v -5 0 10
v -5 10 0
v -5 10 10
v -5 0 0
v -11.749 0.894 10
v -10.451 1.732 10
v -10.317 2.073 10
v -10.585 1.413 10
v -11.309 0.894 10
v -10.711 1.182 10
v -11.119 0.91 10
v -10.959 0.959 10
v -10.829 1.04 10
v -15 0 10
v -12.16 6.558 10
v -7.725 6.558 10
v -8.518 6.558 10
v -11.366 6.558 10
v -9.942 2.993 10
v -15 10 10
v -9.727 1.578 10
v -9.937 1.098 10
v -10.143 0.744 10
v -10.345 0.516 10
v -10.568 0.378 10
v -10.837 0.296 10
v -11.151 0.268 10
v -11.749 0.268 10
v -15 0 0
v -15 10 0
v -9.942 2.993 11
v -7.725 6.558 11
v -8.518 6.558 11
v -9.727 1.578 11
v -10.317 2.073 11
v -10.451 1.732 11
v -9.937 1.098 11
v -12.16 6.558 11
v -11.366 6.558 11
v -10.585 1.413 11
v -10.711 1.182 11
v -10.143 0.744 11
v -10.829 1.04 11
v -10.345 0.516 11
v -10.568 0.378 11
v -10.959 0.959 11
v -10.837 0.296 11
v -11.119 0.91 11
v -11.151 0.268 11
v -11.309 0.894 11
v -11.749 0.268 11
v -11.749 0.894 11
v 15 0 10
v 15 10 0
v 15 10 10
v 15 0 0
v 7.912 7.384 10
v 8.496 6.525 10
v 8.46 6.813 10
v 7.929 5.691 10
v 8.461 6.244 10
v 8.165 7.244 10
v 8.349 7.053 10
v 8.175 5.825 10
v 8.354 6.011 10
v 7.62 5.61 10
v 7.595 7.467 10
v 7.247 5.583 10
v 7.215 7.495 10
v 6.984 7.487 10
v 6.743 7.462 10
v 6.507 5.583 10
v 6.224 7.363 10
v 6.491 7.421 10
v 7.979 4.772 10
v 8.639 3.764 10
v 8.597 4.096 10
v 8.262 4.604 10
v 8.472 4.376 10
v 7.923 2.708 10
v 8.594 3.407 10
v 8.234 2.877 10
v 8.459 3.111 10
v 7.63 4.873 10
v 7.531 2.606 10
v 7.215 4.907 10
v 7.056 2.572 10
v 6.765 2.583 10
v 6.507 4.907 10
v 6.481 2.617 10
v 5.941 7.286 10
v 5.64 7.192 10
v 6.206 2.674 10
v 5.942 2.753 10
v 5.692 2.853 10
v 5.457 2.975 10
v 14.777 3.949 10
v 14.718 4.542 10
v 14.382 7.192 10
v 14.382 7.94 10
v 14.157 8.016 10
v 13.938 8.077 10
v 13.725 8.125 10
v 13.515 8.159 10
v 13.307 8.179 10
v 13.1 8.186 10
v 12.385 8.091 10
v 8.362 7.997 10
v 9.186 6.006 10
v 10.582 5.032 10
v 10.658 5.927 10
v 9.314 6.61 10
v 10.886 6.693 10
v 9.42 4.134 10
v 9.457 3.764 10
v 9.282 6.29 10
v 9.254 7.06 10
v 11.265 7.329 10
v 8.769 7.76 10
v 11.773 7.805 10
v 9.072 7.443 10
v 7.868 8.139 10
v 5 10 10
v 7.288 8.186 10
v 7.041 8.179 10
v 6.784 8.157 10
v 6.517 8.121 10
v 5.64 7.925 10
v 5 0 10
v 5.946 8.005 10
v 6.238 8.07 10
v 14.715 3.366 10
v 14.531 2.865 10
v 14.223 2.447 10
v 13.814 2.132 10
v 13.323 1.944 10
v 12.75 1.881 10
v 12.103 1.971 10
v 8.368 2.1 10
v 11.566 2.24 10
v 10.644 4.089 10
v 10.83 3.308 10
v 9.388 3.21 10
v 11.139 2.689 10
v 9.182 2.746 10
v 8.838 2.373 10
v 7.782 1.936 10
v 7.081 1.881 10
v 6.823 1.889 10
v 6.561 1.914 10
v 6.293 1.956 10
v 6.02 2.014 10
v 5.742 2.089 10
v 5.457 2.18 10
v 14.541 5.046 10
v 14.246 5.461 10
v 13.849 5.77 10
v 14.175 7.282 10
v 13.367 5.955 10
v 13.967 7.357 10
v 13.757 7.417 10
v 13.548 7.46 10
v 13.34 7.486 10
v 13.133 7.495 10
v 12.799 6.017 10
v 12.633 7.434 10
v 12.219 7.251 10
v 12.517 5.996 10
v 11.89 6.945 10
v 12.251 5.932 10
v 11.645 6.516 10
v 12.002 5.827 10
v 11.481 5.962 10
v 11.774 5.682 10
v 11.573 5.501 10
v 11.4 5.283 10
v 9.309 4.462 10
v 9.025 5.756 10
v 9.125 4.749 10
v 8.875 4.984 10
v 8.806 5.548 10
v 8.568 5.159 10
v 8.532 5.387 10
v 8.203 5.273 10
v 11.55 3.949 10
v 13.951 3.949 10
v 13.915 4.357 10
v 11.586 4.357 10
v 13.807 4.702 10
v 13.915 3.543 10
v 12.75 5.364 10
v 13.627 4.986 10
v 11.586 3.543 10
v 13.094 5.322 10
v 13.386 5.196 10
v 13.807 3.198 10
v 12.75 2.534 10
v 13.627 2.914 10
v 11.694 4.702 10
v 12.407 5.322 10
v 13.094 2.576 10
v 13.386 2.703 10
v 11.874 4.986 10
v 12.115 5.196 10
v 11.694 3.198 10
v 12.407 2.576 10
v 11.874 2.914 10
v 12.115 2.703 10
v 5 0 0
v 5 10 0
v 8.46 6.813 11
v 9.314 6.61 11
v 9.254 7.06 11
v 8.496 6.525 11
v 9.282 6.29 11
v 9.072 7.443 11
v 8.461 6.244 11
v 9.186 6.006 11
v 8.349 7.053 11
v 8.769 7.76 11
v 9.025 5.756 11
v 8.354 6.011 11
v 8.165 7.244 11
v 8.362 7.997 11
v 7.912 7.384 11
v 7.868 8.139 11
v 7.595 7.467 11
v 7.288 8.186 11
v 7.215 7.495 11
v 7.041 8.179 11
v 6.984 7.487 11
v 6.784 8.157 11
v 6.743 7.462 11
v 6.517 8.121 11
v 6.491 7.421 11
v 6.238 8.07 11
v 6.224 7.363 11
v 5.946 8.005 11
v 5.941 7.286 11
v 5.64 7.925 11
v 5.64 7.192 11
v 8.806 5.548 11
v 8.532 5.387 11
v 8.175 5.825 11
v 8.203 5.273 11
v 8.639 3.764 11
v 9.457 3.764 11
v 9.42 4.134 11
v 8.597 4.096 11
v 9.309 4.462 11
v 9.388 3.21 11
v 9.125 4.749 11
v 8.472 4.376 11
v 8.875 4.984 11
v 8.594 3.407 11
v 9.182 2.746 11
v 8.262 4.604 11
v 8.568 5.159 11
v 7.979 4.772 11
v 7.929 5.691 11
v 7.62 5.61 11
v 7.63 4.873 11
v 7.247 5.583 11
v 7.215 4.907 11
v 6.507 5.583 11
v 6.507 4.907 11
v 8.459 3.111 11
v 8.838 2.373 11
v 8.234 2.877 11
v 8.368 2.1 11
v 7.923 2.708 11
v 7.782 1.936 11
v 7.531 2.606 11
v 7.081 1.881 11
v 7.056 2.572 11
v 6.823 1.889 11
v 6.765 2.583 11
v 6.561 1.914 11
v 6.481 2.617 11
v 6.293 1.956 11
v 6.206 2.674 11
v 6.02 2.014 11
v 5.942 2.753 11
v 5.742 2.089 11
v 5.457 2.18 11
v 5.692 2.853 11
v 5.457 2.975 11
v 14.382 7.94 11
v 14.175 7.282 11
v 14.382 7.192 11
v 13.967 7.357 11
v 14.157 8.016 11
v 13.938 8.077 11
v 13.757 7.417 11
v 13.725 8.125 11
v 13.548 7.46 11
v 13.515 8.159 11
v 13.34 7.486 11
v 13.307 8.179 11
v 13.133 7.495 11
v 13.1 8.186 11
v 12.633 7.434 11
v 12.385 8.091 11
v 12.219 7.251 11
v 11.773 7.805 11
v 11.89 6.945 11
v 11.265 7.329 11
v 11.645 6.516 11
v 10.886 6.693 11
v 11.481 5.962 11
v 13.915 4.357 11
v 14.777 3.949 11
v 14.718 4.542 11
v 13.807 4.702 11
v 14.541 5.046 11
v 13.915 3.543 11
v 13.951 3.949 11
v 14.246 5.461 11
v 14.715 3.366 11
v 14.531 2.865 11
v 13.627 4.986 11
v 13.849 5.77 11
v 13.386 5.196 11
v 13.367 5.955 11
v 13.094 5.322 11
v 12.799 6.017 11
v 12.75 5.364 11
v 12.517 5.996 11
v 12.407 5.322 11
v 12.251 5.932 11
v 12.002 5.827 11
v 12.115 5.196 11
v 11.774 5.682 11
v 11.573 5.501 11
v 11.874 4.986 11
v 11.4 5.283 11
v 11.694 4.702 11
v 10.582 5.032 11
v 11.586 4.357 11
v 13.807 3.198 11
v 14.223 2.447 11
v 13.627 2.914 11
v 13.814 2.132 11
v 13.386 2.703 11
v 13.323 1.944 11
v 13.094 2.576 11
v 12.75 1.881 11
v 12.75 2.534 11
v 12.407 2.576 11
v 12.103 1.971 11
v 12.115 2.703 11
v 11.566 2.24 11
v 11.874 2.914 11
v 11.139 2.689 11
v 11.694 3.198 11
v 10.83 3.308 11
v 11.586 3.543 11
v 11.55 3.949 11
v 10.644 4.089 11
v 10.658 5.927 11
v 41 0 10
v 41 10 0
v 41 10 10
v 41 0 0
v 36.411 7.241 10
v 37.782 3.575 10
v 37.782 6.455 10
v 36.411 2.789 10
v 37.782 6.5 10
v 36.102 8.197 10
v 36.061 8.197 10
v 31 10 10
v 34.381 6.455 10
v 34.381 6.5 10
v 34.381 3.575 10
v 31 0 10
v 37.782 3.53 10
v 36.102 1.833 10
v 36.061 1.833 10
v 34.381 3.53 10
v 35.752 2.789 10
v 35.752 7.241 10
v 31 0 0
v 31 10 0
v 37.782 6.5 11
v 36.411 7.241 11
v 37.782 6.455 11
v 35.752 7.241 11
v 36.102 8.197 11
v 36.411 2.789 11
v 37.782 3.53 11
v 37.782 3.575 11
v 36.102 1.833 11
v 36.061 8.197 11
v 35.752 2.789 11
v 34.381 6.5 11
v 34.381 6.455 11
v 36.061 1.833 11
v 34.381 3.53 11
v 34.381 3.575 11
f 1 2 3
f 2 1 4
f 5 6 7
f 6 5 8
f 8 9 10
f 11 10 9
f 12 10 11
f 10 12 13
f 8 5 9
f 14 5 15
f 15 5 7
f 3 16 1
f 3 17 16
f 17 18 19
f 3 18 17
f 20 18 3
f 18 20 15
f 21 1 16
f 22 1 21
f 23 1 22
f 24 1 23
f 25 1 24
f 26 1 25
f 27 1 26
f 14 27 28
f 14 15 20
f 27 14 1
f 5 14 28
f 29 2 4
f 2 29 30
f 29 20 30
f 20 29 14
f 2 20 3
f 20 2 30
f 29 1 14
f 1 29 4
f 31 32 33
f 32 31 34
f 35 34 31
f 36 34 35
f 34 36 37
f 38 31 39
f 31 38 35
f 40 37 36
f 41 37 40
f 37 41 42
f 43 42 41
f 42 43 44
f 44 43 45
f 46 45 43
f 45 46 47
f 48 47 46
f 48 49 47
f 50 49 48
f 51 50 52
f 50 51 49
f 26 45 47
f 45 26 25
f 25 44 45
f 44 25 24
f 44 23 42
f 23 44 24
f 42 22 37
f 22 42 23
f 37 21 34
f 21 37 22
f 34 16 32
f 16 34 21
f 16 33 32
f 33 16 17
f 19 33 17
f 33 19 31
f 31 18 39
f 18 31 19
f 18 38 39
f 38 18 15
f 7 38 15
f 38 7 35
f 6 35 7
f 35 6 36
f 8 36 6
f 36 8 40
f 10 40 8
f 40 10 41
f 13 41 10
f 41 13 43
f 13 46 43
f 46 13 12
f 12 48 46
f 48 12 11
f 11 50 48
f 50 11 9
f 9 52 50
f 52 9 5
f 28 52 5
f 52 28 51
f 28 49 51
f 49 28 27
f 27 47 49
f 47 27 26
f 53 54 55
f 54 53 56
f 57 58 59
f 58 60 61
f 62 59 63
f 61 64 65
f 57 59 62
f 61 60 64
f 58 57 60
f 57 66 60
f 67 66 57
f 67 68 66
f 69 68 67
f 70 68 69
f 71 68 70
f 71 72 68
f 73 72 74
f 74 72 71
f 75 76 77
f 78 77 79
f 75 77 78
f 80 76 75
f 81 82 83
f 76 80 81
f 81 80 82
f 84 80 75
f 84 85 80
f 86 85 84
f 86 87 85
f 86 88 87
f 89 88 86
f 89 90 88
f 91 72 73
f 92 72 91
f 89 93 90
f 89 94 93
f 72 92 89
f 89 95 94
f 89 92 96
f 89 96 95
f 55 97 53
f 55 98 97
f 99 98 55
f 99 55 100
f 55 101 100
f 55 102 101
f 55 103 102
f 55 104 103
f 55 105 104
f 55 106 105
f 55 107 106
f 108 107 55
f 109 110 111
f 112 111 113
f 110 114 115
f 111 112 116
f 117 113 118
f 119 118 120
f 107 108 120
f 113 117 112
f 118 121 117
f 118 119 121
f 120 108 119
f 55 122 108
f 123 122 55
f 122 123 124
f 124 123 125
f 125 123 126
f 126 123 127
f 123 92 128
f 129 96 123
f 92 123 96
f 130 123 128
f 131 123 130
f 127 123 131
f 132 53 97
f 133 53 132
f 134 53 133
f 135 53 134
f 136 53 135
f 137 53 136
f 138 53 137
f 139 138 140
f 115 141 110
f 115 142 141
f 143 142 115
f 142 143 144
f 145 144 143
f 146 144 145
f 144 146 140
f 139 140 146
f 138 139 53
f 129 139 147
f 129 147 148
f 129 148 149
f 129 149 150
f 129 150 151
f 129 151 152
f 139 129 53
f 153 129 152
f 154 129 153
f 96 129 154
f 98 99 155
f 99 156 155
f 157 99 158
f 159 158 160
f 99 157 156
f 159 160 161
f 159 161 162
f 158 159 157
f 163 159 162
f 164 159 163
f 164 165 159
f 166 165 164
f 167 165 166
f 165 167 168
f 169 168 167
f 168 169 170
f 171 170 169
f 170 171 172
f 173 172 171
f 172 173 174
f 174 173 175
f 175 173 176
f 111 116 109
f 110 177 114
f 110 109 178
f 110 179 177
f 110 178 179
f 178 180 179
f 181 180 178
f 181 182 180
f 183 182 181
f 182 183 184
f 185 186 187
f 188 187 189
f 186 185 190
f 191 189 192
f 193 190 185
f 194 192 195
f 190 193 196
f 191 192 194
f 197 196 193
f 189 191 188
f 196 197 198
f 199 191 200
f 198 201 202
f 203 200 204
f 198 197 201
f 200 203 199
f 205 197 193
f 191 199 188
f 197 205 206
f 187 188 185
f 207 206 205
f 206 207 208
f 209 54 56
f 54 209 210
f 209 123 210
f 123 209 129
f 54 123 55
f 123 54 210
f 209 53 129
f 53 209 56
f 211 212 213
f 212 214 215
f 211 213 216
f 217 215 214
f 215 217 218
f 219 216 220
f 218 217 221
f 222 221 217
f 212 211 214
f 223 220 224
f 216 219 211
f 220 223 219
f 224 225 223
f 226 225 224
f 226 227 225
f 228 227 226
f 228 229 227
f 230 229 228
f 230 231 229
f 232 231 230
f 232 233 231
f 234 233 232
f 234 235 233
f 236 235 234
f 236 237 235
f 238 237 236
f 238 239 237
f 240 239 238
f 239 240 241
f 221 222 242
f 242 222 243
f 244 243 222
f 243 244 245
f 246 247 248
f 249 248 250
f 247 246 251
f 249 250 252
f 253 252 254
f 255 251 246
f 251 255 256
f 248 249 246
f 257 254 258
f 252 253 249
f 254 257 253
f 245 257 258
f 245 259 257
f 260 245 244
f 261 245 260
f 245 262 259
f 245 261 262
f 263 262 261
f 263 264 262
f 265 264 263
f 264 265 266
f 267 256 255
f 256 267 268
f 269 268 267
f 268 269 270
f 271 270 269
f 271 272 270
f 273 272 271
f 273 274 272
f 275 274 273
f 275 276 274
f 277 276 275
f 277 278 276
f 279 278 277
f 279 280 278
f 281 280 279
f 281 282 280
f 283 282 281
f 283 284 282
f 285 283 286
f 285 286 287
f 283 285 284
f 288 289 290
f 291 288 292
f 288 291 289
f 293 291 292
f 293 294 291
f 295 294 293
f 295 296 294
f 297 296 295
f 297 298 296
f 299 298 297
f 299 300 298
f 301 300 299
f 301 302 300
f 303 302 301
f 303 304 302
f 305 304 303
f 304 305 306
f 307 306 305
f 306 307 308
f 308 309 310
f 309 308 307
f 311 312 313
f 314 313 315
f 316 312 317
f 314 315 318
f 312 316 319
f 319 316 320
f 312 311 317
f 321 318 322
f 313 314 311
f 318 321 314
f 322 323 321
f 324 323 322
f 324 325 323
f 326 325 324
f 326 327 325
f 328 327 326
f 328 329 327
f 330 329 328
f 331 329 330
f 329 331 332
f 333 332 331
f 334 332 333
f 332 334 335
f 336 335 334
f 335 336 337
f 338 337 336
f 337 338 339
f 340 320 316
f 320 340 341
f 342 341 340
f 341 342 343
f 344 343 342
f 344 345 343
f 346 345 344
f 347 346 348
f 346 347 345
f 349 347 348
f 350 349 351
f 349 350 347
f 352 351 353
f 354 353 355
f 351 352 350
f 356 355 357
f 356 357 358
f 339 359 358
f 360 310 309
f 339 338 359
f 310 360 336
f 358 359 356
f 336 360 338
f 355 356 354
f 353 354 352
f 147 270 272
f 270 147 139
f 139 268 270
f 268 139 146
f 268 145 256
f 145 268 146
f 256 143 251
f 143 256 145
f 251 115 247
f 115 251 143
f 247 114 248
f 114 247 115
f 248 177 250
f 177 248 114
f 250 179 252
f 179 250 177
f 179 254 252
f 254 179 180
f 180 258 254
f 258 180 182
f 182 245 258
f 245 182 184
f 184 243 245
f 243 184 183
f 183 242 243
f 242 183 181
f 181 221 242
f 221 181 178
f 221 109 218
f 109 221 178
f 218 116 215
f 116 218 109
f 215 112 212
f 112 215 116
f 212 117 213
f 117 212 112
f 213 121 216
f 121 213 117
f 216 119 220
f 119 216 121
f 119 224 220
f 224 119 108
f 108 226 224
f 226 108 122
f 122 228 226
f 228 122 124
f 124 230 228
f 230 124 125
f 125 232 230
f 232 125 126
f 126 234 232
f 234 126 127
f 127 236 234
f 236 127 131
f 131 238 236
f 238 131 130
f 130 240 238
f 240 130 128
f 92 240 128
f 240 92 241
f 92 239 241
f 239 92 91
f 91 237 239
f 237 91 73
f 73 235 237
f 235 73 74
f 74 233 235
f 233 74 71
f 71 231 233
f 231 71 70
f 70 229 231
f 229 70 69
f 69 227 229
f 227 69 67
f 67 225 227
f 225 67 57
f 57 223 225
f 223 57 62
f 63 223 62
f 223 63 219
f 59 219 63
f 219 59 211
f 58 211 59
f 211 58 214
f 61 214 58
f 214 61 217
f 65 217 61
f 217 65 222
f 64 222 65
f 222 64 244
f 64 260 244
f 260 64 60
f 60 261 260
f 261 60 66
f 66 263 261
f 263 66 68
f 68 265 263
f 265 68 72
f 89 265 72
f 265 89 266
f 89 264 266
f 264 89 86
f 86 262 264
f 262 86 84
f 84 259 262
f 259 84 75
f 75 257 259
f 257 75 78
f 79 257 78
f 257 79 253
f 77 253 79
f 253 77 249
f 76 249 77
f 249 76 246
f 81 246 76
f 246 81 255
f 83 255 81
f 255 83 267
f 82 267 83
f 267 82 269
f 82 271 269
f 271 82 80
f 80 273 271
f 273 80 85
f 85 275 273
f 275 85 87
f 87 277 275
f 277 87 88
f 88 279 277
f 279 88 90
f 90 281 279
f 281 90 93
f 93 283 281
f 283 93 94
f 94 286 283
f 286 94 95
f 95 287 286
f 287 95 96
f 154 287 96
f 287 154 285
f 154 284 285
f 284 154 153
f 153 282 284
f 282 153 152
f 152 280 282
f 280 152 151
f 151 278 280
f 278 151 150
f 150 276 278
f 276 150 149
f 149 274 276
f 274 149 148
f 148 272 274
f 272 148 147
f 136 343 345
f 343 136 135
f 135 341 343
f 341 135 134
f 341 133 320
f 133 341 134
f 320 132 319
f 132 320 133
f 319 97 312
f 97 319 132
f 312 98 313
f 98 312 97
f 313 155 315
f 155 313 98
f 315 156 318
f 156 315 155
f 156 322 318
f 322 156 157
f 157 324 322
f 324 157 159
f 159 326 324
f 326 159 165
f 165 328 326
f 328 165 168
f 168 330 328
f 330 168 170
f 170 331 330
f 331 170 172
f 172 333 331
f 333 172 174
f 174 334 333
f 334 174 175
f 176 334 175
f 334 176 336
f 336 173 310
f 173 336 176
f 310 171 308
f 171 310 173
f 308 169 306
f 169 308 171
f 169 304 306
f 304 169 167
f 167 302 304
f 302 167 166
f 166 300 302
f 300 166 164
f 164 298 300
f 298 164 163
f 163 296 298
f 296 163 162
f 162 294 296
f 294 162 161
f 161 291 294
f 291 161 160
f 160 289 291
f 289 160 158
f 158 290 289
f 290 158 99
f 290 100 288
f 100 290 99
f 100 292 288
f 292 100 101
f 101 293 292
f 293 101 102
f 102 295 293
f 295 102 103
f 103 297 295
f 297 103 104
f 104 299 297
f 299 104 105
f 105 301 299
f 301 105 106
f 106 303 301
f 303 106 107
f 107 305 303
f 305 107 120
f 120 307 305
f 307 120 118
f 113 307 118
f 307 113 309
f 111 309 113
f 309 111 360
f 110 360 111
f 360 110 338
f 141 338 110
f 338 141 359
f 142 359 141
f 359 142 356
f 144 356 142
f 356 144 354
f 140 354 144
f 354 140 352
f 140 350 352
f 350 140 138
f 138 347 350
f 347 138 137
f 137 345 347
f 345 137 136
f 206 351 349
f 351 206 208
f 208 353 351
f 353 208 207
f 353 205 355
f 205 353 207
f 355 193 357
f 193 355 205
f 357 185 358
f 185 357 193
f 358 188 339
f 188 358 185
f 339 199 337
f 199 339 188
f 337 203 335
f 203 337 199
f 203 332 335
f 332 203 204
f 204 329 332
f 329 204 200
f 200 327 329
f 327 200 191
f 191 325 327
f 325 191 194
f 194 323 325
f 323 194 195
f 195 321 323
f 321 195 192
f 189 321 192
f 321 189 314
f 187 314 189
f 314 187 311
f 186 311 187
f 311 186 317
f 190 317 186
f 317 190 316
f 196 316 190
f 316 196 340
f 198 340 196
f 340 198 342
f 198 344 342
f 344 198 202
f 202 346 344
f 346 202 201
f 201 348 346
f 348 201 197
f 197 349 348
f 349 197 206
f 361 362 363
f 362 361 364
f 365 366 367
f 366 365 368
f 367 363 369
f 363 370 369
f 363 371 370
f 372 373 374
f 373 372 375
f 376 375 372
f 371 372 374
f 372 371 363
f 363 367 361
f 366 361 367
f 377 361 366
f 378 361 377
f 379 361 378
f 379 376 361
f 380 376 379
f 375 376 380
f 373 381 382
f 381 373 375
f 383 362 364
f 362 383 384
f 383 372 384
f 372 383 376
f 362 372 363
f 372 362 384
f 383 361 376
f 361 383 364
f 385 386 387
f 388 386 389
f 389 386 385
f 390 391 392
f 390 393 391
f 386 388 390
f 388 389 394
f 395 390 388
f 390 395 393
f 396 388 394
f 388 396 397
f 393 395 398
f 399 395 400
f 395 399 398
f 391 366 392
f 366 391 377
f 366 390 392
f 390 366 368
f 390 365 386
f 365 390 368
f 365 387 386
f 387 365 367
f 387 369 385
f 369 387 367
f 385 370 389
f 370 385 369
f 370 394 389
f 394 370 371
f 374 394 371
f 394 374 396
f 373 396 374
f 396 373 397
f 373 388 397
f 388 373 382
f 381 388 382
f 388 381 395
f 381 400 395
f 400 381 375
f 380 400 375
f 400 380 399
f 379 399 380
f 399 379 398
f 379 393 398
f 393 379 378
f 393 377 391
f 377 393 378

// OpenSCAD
// -*- mode: SCAD ; c-file-style: "ellemtel" ; coding: utf-8 -*-
//
// Rough extruder offest calibration
// Extruder one part
// Just a few simple blocks
//
// © 2017 Roland Sieker <ospalh@gmail.com>
// Licence: CC-BY-SA 4.0



// Change this to fit your actual printer, as well as you know
ditto_offset = 36.0;



font_name = "Demos LT";
// font_name = "Palatino";
// font_name = "serif";
// font_name = "bugger, haven’t got this one";
font_name_2 = "Demos X";
font_name_3 = "serif";

translate([-15, 0, 0])
{
   cube([10,10,10]);
   translate([5, 2, 10])
   {
      linear_extrude(1)
      {
         text("y", 6, font=font_name, halign="center", valgin="center");
      }
   }
}
translate([5, 0, 0])
{
   cube([10,10,10]);
   translate([5, 2, 10])
   {
      linear_extrude(1)
      {
         text("36", 6, font=font_name_2, halign="center", valgin="center");
      }
   }
}


translate([ditto_offset, 0, 0])
{
translate([-5, 0, 0])
{
   cube([10,10,10]);
   translate([5, 2, 10])
   {
      linear_extrude(1)
      {
         text("↕", 6, font=font_name_3, halign="center", valgin="center");
      }
   }
}
}
